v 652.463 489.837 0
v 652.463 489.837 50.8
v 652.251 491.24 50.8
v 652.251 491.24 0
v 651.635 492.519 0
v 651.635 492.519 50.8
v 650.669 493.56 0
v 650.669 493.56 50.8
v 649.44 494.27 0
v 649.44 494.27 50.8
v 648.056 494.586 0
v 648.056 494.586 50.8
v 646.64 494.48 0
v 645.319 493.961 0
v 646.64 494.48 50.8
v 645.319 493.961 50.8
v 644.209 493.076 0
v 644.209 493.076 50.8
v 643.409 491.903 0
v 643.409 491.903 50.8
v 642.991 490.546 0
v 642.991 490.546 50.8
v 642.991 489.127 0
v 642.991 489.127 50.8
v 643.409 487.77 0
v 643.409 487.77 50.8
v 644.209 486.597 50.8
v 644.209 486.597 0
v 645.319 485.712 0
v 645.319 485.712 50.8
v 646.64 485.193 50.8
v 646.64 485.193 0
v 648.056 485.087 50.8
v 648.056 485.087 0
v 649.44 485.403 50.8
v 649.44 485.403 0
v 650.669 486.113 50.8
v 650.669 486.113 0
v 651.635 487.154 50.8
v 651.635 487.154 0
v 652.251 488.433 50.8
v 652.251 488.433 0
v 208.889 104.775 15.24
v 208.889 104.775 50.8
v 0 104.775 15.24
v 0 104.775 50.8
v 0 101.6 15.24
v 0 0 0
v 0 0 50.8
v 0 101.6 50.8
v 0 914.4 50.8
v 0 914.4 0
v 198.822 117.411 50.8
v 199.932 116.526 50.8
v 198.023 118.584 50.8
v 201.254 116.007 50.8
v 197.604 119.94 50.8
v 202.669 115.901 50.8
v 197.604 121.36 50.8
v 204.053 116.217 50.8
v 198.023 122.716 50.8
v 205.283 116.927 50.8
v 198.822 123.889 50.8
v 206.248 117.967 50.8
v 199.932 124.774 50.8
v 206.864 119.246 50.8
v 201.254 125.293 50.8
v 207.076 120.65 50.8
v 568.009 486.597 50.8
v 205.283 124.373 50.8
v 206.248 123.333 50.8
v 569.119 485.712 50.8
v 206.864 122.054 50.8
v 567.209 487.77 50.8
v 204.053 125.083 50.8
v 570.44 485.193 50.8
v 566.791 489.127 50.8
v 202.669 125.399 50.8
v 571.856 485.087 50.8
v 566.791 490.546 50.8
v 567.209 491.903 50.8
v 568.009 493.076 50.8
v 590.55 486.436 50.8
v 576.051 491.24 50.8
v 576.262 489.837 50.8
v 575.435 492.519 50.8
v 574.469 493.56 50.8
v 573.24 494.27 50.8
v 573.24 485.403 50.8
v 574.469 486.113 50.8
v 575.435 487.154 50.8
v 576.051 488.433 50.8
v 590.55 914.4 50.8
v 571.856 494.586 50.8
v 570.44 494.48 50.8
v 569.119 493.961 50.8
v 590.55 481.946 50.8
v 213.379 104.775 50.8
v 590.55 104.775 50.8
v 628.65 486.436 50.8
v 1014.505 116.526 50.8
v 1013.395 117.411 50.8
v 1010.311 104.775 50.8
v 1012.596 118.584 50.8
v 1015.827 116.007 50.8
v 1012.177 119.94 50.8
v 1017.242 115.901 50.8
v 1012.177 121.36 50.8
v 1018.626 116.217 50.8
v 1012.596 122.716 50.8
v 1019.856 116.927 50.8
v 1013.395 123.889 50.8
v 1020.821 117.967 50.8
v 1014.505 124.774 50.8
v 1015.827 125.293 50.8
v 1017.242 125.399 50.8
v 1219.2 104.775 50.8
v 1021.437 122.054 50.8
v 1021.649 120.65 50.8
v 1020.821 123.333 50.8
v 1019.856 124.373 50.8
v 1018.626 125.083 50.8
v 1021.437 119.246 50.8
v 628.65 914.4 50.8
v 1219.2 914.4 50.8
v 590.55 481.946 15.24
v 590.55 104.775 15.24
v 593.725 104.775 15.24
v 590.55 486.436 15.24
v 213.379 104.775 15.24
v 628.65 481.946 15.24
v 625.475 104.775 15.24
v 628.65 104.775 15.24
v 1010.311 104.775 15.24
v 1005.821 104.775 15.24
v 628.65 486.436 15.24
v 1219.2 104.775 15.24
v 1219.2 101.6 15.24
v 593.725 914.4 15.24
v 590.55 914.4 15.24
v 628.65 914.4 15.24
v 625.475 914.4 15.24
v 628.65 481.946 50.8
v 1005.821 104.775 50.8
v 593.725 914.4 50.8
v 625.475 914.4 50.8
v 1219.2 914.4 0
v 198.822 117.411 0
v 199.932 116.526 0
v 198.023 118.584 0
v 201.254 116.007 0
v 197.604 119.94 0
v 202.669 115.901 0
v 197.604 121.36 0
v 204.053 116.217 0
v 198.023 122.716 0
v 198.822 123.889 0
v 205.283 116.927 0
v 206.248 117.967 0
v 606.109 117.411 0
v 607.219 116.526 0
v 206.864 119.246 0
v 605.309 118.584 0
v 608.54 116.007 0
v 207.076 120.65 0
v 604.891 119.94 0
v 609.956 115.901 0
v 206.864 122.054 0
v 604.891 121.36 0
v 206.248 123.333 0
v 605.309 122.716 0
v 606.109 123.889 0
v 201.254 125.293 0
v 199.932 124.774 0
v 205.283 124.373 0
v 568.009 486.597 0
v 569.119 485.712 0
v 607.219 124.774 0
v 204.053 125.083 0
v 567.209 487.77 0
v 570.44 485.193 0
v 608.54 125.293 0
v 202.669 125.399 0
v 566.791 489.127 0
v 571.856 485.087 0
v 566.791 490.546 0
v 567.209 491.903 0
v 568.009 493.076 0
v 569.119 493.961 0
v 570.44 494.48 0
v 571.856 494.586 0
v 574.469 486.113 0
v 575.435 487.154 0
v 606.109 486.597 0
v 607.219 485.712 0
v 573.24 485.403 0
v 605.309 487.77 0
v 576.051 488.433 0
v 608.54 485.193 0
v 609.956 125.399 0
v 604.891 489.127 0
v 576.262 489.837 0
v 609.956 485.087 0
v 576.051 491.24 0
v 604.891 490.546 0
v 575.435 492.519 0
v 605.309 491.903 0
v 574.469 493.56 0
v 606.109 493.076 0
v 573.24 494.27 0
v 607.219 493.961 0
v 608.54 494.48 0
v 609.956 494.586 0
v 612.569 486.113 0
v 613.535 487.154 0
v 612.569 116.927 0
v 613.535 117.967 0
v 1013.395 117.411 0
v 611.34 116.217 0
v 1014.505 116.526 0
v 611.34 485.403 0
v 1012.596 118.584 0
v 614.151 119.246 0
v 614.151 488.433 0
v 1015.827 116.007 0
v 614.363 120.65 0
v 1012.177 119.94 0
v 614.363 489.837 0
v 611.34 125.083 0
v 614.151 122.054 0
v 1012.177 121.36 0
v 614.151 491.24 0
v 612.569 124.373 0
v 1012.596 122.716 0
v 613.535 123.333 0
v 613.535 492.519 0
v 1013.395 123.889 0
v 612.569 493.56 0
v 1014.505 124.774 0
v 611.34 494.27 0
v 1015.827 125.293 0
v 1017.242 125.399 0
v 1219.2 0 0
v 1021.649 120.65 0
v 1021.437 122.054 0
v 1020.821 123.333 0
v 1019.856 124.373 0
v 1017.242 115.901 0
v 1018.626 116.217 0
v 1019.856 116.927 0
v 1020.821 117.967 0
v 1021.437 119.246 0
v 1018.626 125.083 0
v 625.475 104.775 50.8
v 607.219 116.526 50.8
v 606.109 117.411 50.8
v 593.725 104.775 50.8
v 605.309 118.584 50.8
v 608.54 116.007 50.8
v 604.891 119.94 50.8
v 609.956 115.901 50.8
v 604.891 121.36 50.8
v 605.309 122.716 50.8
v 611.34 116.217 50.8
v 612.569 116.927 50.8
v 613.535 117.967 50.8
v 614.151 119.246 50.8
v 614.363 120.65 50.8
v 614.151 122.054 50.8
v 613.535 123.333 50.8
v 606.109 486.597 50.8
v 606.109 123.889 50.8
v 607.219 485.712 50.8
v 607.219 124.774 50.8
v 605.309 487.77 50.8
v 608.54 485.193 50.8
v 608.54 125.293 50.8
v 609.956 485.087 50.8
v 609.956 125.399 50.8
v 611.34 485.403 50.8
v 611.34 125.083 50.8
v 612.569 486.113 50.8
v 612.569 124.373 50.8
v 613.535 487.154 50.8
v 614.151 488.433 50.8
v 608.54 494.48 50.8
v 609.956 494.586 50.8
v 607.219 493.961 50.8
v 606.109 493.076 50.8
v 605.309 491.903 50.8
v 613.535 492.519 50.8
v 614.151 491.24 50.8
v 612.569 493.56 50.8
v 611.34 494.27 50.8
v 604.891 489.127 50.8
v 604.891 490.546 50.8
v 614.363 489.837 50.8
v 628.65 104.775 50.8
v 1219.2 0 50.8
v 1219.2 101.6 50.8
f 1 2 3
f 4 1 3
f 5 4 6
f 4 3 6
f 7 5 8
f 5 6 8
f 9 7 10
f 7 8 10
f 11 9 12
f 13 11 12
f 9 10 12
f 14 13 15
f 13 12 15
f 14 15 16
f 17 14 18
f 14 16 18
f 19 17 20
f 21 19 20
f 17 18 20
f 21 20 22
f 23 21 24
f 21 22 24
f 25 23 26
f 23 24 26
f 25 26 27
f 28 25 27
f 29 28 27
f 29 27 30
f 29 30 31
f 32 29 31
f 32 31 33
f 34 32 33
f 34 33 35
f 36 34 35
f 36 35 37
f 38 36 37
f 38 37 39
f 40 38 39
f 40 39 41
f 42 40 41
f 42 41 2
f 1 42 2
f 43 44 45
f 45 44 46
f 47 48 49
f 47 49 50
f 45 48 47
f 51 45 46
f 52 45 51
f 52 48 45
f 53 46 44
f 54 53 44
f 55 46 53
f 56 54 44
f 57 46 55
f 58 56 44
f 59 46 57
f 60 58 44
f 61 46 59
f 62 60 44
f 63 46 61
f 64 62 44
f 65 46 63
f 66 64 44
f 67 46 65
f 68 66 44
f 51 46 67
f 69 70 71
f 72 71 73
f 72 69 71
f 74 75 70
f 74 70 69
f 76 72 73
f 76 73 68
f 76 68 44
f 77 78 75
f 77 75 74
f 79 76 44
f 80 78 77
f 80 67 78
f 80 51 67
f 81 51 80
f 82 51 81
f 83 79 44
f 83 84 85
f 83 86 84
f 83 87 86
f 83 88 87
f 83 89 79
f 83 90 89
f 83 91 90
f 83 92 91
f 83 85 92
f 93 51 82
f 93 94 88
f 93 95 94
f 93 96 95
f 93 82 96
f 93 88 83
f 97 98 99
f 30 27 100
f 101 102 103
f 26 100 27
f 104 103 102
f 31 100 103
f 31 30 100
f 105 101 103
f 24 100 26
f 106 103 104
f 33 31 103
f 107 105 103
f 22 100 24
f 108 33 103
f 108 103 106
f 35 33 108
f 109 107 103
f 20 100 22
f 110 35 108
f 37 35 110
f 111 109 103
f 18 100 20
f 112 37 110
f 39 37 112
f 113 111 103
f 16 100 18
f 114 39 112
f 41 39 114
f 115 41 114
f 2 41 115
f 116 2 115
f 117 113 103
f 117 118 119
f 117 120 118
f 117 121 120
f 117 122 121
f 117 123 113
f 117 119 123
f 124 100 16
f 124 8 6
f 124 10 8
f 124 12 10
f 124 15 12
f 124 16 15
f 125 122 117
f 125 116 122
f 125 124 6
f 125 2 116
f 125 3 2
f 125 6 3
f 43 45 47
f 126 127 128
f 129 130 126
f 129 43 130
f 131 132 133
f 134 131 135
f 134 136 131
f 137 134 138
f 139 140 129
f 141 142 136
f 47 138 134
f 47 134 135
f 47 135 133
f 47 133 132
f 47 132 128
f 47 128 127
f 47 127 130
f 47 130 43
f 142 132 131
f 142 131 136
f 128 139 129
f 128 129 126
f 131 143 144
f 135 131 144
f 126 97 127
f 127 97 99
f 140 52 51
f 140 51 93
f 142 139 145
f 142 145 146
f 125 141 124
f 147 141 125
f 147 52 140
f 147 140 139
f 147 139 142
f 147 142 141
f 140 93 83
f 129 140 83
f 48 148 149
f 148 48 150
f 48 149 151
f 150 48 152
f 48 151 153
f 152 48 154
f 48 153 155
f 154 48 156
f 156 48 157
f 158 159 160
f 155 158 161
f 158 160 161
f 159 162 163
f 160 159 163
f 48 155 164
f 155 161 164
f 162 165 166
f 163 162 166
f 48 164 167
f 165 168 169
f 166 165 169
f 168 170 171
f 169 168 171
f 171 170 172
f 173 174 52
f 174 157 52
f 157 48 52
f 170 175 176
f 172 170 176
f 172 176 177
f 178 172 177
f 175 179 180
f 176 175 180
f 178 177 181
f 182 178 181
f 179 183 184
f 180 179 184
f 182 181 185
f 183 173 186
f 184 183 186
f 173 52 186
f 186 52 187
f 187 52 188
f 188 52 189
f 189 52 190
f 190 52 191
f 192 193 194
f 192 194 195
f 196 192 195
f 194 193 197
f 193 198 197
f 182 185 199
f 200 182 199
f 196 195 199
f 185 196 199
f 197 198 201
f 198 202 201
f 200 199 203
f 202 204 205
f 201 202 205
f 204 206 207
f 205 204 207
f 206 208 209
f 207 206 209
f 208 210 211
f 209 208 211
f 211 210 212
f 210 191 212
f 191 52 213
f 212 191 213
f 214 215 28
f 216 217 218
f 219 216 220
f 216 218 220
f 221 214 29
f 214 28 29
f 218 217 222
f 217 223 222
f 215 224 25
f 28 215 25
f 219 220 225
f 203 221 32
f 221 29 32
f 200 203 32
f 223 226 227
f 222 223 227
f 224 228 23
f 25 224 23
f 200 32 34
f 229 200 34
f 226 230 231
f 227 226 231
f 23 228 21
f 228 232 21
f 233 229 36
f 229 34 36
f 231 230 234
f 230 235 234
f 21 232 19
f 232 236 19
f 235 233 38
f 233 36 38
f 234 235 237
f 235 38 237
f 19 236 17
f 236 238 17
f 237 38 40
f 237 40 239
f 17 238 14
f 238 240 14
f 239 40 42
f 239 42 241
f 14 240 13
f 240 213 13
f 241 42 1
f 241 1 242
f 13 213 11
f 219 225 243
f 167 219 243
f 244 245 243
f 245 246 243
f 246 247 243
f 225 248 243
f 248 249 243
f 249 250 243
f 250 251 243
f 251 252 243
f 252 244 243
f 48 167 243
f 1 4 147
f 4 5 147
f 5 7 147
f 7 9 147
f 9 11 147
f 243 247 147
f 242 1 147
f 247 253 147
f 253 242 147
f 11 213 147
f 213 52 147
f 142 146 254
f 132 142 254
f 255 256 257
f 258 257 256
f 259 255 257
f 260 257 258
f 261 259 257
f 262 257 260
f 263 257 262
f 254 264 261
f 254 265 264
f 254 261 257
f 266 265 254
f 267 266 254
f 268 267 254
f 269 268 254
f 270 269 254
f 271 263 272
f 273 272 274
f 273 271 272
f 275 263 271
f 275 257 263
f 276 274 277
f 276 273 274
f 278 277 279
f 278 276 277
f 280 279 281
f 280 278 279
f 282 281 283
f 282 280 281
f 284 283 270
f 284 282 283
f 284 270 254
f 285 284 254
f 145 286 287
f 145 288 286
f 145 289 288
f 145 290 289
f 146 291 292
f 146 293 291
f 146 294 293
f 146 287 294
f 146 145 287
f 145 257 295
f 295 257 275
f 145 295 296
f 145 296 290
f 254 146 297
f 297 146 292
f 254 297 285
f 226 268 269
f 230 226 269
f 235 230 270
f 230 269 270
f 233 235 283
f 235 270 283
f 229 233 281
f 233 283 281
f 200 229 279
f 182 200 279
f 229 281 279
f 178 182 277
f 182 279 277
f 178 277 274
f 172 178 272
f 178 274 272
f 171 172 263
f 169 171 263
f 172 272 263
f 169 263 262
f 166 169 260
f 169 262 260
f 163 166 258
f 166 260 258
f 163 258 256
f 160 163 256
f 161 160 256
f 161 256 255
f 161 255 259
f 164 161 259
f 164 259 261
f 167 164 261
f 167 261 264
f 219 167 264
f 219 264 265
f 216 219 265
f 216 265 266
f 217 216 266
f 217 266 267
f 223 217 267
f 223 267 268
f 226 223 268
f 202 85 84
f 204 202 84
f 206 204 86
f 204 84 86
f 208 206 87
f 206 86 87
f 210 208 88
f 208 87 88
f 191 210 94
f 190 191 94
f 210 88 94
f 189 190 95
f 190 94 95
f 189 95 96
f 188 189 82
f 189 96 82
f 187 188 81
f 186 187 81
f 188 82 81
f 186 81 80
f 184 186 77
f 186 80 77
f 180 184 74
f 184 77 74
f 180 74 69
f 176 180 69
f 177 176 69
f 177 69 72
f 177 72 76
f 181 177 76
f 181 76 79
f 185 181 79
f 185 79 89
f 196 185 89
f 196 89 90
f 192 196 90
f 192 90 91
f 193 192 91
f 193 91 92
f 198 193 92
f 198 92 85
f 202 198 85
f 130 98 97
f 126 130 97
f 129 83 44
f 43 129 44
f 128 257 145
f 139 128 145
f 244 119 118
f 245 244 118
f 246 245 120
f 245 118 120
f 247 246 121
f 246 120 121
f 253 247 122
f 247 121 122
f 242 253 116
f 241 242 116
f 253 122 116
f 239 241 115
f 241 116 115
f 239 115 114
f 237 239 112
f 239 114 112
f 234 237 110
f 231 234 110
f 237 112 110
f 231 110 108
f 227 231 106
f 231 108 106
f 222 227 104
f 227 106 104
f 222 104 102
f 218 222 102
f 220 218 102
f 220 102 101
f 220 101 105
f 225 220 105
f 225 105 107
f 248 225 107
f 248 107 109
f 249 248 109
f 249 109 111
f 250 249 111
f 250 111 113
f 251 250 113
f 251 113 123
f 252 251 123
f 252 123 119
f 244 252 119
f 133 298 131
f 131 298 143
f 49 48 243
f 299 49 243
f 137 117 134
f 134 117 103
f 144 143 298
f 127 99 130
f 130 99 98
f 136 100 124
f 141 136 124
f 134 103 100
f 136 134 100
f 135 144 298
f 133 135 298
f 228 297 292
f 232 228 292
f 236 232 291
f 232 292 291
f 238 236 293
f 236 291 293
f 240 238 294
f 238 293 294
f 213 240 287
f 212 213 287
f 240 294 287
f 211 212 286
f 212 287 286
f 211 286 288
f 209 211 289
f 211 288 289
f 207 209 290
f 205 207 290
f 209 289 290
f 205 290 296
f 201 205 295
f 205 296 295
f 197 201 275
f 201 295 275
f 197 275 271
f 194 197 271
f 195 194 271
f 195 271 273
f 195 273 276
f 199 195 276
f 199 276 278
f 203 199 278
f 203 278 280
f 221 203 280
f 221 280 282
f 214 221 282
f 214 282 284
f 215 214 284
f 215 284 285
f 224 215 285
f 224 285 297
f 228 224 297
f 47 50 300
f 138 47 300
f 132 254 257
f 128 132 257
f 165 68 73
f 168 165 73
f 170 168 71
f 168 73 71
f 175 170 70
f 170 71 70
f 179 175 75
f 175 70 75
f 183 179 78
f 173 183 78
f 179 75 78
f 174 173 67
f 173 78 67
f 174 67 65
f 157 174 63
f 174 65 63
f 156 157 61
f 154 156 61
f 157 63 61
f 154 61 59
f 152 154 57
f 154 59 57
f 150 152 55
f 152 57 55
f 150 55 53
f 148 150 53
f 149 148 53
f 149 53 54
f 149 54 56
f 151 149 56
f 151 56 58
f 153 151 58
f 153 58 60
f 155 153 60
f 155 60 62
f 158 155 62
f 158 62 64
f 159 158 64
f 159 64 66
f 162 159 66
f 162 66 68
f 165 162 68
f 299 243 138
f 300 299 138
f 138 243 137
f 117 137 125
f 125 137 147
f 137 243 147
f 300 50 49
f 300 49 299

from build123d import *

# Parameters (mm, degrees)
F0_W     = 1219.2
F0_H     = 914.4
F1_DEPTH = 50.8
F2_W     = 3.175
F2_H     = 34.925
F3_DEPTH = 35.56
F4_R     = 4.7625
F5_DEPTH = 50.801


with BuildPart() as f1:
    # F0 (on Top) → F1 (new body)
    with BuildSketch(Plane.XY):
        with Locations((609.6, 457.2)):
            Rectangle(F0_W, F0_H)
    extrude(amount=F1_DEPTH)

    # F2 (on face) → F3 (cut)
    with BuildSketch(Plane.XY.offset(50.8)):
        Polygon((590.55, 486.4358851454), (243.8141148546, 139.7), (248.3042429151, 139.7), (590.55, 481.9457570849), align=None)
        Polygon((590.55, 914.4), (590.55, 535.8272938113), (590.55, 486.4358851454), (590.55, 481.9457570849), (590.55, 139.7), (593.725, 139.7), (593.725, 914.4), align=None)
        Polygon((970.8957570849, 139.7), (975.3858851454, 139.7), (628.65, 486.4358851454), (628.65, 481.9457570849), align=None)
        with Locations((592.1375, 122.2375)):
            Rectangle(F2_W, F2_H)
        Polygon((0, 104.775), (0, 101.6), (1219.2, 101.6), (1219.2, 104.775), (1059.7022938113, 104.775), (1010.3108851454, 104.775), (1005.8207570849, 104.775), (628.65, 104.775), (625.475, 104.775), (593.725, 104.775), (590.55, 104.775), (213.3792429151, 104.775), (208.8891148546, 104.775), (159.4977061887, 104.775), align=None)
        Polygon((243.8141148546, 139.7), (208.8891148546, 104.775), (213.3792429151, 104.775), (248.3042429151, 139.7), align=None)
        Polygon((1005.8207570849, 104.775), (1010.3108851454, 104.775), (975.3858851454, 139.7), (970.8957570849, 139.7), align=None)
        Polygon((628.65, 486.4358851454), (628.65, 535.8272938113), (628.65, 914.4), (625.475, 914.4), (625.475, 139.7), (628.65, 139.7), (628.65, 481.9457570849), align=None)
        with Locations((627.0625, 122.2375)):
            Rectangle(F2_W, F2_H)
    extrude(amount=-F3_DEPTH, mode=Mode.SUBTRACT)

    # F4 (on face) → F5 (cut, through all)
    with BuildSketch(Plane.XY.offset(50.8)):
        with Locations((202.3134745519, 120.65)):
            Circle(F4_R)
        with Locations((571.5, 489.8365254481)):
            Circle(F4_R)
        with Locations((609.6, 489.8365254481)):
            Circle(F4_R)
        with Locations((647.7, 489.8365254481)):
            Circle(F4_R)
        with Locations((609.6, 120.65)):
            Circle(F4_R)
        with Locations((1016.8865254481, 120.65)):
            Circle(F4_R)
    extrude(amount=-F5_DEPTH, mode=Mode.SUBTRACT)


solid = f1.part
